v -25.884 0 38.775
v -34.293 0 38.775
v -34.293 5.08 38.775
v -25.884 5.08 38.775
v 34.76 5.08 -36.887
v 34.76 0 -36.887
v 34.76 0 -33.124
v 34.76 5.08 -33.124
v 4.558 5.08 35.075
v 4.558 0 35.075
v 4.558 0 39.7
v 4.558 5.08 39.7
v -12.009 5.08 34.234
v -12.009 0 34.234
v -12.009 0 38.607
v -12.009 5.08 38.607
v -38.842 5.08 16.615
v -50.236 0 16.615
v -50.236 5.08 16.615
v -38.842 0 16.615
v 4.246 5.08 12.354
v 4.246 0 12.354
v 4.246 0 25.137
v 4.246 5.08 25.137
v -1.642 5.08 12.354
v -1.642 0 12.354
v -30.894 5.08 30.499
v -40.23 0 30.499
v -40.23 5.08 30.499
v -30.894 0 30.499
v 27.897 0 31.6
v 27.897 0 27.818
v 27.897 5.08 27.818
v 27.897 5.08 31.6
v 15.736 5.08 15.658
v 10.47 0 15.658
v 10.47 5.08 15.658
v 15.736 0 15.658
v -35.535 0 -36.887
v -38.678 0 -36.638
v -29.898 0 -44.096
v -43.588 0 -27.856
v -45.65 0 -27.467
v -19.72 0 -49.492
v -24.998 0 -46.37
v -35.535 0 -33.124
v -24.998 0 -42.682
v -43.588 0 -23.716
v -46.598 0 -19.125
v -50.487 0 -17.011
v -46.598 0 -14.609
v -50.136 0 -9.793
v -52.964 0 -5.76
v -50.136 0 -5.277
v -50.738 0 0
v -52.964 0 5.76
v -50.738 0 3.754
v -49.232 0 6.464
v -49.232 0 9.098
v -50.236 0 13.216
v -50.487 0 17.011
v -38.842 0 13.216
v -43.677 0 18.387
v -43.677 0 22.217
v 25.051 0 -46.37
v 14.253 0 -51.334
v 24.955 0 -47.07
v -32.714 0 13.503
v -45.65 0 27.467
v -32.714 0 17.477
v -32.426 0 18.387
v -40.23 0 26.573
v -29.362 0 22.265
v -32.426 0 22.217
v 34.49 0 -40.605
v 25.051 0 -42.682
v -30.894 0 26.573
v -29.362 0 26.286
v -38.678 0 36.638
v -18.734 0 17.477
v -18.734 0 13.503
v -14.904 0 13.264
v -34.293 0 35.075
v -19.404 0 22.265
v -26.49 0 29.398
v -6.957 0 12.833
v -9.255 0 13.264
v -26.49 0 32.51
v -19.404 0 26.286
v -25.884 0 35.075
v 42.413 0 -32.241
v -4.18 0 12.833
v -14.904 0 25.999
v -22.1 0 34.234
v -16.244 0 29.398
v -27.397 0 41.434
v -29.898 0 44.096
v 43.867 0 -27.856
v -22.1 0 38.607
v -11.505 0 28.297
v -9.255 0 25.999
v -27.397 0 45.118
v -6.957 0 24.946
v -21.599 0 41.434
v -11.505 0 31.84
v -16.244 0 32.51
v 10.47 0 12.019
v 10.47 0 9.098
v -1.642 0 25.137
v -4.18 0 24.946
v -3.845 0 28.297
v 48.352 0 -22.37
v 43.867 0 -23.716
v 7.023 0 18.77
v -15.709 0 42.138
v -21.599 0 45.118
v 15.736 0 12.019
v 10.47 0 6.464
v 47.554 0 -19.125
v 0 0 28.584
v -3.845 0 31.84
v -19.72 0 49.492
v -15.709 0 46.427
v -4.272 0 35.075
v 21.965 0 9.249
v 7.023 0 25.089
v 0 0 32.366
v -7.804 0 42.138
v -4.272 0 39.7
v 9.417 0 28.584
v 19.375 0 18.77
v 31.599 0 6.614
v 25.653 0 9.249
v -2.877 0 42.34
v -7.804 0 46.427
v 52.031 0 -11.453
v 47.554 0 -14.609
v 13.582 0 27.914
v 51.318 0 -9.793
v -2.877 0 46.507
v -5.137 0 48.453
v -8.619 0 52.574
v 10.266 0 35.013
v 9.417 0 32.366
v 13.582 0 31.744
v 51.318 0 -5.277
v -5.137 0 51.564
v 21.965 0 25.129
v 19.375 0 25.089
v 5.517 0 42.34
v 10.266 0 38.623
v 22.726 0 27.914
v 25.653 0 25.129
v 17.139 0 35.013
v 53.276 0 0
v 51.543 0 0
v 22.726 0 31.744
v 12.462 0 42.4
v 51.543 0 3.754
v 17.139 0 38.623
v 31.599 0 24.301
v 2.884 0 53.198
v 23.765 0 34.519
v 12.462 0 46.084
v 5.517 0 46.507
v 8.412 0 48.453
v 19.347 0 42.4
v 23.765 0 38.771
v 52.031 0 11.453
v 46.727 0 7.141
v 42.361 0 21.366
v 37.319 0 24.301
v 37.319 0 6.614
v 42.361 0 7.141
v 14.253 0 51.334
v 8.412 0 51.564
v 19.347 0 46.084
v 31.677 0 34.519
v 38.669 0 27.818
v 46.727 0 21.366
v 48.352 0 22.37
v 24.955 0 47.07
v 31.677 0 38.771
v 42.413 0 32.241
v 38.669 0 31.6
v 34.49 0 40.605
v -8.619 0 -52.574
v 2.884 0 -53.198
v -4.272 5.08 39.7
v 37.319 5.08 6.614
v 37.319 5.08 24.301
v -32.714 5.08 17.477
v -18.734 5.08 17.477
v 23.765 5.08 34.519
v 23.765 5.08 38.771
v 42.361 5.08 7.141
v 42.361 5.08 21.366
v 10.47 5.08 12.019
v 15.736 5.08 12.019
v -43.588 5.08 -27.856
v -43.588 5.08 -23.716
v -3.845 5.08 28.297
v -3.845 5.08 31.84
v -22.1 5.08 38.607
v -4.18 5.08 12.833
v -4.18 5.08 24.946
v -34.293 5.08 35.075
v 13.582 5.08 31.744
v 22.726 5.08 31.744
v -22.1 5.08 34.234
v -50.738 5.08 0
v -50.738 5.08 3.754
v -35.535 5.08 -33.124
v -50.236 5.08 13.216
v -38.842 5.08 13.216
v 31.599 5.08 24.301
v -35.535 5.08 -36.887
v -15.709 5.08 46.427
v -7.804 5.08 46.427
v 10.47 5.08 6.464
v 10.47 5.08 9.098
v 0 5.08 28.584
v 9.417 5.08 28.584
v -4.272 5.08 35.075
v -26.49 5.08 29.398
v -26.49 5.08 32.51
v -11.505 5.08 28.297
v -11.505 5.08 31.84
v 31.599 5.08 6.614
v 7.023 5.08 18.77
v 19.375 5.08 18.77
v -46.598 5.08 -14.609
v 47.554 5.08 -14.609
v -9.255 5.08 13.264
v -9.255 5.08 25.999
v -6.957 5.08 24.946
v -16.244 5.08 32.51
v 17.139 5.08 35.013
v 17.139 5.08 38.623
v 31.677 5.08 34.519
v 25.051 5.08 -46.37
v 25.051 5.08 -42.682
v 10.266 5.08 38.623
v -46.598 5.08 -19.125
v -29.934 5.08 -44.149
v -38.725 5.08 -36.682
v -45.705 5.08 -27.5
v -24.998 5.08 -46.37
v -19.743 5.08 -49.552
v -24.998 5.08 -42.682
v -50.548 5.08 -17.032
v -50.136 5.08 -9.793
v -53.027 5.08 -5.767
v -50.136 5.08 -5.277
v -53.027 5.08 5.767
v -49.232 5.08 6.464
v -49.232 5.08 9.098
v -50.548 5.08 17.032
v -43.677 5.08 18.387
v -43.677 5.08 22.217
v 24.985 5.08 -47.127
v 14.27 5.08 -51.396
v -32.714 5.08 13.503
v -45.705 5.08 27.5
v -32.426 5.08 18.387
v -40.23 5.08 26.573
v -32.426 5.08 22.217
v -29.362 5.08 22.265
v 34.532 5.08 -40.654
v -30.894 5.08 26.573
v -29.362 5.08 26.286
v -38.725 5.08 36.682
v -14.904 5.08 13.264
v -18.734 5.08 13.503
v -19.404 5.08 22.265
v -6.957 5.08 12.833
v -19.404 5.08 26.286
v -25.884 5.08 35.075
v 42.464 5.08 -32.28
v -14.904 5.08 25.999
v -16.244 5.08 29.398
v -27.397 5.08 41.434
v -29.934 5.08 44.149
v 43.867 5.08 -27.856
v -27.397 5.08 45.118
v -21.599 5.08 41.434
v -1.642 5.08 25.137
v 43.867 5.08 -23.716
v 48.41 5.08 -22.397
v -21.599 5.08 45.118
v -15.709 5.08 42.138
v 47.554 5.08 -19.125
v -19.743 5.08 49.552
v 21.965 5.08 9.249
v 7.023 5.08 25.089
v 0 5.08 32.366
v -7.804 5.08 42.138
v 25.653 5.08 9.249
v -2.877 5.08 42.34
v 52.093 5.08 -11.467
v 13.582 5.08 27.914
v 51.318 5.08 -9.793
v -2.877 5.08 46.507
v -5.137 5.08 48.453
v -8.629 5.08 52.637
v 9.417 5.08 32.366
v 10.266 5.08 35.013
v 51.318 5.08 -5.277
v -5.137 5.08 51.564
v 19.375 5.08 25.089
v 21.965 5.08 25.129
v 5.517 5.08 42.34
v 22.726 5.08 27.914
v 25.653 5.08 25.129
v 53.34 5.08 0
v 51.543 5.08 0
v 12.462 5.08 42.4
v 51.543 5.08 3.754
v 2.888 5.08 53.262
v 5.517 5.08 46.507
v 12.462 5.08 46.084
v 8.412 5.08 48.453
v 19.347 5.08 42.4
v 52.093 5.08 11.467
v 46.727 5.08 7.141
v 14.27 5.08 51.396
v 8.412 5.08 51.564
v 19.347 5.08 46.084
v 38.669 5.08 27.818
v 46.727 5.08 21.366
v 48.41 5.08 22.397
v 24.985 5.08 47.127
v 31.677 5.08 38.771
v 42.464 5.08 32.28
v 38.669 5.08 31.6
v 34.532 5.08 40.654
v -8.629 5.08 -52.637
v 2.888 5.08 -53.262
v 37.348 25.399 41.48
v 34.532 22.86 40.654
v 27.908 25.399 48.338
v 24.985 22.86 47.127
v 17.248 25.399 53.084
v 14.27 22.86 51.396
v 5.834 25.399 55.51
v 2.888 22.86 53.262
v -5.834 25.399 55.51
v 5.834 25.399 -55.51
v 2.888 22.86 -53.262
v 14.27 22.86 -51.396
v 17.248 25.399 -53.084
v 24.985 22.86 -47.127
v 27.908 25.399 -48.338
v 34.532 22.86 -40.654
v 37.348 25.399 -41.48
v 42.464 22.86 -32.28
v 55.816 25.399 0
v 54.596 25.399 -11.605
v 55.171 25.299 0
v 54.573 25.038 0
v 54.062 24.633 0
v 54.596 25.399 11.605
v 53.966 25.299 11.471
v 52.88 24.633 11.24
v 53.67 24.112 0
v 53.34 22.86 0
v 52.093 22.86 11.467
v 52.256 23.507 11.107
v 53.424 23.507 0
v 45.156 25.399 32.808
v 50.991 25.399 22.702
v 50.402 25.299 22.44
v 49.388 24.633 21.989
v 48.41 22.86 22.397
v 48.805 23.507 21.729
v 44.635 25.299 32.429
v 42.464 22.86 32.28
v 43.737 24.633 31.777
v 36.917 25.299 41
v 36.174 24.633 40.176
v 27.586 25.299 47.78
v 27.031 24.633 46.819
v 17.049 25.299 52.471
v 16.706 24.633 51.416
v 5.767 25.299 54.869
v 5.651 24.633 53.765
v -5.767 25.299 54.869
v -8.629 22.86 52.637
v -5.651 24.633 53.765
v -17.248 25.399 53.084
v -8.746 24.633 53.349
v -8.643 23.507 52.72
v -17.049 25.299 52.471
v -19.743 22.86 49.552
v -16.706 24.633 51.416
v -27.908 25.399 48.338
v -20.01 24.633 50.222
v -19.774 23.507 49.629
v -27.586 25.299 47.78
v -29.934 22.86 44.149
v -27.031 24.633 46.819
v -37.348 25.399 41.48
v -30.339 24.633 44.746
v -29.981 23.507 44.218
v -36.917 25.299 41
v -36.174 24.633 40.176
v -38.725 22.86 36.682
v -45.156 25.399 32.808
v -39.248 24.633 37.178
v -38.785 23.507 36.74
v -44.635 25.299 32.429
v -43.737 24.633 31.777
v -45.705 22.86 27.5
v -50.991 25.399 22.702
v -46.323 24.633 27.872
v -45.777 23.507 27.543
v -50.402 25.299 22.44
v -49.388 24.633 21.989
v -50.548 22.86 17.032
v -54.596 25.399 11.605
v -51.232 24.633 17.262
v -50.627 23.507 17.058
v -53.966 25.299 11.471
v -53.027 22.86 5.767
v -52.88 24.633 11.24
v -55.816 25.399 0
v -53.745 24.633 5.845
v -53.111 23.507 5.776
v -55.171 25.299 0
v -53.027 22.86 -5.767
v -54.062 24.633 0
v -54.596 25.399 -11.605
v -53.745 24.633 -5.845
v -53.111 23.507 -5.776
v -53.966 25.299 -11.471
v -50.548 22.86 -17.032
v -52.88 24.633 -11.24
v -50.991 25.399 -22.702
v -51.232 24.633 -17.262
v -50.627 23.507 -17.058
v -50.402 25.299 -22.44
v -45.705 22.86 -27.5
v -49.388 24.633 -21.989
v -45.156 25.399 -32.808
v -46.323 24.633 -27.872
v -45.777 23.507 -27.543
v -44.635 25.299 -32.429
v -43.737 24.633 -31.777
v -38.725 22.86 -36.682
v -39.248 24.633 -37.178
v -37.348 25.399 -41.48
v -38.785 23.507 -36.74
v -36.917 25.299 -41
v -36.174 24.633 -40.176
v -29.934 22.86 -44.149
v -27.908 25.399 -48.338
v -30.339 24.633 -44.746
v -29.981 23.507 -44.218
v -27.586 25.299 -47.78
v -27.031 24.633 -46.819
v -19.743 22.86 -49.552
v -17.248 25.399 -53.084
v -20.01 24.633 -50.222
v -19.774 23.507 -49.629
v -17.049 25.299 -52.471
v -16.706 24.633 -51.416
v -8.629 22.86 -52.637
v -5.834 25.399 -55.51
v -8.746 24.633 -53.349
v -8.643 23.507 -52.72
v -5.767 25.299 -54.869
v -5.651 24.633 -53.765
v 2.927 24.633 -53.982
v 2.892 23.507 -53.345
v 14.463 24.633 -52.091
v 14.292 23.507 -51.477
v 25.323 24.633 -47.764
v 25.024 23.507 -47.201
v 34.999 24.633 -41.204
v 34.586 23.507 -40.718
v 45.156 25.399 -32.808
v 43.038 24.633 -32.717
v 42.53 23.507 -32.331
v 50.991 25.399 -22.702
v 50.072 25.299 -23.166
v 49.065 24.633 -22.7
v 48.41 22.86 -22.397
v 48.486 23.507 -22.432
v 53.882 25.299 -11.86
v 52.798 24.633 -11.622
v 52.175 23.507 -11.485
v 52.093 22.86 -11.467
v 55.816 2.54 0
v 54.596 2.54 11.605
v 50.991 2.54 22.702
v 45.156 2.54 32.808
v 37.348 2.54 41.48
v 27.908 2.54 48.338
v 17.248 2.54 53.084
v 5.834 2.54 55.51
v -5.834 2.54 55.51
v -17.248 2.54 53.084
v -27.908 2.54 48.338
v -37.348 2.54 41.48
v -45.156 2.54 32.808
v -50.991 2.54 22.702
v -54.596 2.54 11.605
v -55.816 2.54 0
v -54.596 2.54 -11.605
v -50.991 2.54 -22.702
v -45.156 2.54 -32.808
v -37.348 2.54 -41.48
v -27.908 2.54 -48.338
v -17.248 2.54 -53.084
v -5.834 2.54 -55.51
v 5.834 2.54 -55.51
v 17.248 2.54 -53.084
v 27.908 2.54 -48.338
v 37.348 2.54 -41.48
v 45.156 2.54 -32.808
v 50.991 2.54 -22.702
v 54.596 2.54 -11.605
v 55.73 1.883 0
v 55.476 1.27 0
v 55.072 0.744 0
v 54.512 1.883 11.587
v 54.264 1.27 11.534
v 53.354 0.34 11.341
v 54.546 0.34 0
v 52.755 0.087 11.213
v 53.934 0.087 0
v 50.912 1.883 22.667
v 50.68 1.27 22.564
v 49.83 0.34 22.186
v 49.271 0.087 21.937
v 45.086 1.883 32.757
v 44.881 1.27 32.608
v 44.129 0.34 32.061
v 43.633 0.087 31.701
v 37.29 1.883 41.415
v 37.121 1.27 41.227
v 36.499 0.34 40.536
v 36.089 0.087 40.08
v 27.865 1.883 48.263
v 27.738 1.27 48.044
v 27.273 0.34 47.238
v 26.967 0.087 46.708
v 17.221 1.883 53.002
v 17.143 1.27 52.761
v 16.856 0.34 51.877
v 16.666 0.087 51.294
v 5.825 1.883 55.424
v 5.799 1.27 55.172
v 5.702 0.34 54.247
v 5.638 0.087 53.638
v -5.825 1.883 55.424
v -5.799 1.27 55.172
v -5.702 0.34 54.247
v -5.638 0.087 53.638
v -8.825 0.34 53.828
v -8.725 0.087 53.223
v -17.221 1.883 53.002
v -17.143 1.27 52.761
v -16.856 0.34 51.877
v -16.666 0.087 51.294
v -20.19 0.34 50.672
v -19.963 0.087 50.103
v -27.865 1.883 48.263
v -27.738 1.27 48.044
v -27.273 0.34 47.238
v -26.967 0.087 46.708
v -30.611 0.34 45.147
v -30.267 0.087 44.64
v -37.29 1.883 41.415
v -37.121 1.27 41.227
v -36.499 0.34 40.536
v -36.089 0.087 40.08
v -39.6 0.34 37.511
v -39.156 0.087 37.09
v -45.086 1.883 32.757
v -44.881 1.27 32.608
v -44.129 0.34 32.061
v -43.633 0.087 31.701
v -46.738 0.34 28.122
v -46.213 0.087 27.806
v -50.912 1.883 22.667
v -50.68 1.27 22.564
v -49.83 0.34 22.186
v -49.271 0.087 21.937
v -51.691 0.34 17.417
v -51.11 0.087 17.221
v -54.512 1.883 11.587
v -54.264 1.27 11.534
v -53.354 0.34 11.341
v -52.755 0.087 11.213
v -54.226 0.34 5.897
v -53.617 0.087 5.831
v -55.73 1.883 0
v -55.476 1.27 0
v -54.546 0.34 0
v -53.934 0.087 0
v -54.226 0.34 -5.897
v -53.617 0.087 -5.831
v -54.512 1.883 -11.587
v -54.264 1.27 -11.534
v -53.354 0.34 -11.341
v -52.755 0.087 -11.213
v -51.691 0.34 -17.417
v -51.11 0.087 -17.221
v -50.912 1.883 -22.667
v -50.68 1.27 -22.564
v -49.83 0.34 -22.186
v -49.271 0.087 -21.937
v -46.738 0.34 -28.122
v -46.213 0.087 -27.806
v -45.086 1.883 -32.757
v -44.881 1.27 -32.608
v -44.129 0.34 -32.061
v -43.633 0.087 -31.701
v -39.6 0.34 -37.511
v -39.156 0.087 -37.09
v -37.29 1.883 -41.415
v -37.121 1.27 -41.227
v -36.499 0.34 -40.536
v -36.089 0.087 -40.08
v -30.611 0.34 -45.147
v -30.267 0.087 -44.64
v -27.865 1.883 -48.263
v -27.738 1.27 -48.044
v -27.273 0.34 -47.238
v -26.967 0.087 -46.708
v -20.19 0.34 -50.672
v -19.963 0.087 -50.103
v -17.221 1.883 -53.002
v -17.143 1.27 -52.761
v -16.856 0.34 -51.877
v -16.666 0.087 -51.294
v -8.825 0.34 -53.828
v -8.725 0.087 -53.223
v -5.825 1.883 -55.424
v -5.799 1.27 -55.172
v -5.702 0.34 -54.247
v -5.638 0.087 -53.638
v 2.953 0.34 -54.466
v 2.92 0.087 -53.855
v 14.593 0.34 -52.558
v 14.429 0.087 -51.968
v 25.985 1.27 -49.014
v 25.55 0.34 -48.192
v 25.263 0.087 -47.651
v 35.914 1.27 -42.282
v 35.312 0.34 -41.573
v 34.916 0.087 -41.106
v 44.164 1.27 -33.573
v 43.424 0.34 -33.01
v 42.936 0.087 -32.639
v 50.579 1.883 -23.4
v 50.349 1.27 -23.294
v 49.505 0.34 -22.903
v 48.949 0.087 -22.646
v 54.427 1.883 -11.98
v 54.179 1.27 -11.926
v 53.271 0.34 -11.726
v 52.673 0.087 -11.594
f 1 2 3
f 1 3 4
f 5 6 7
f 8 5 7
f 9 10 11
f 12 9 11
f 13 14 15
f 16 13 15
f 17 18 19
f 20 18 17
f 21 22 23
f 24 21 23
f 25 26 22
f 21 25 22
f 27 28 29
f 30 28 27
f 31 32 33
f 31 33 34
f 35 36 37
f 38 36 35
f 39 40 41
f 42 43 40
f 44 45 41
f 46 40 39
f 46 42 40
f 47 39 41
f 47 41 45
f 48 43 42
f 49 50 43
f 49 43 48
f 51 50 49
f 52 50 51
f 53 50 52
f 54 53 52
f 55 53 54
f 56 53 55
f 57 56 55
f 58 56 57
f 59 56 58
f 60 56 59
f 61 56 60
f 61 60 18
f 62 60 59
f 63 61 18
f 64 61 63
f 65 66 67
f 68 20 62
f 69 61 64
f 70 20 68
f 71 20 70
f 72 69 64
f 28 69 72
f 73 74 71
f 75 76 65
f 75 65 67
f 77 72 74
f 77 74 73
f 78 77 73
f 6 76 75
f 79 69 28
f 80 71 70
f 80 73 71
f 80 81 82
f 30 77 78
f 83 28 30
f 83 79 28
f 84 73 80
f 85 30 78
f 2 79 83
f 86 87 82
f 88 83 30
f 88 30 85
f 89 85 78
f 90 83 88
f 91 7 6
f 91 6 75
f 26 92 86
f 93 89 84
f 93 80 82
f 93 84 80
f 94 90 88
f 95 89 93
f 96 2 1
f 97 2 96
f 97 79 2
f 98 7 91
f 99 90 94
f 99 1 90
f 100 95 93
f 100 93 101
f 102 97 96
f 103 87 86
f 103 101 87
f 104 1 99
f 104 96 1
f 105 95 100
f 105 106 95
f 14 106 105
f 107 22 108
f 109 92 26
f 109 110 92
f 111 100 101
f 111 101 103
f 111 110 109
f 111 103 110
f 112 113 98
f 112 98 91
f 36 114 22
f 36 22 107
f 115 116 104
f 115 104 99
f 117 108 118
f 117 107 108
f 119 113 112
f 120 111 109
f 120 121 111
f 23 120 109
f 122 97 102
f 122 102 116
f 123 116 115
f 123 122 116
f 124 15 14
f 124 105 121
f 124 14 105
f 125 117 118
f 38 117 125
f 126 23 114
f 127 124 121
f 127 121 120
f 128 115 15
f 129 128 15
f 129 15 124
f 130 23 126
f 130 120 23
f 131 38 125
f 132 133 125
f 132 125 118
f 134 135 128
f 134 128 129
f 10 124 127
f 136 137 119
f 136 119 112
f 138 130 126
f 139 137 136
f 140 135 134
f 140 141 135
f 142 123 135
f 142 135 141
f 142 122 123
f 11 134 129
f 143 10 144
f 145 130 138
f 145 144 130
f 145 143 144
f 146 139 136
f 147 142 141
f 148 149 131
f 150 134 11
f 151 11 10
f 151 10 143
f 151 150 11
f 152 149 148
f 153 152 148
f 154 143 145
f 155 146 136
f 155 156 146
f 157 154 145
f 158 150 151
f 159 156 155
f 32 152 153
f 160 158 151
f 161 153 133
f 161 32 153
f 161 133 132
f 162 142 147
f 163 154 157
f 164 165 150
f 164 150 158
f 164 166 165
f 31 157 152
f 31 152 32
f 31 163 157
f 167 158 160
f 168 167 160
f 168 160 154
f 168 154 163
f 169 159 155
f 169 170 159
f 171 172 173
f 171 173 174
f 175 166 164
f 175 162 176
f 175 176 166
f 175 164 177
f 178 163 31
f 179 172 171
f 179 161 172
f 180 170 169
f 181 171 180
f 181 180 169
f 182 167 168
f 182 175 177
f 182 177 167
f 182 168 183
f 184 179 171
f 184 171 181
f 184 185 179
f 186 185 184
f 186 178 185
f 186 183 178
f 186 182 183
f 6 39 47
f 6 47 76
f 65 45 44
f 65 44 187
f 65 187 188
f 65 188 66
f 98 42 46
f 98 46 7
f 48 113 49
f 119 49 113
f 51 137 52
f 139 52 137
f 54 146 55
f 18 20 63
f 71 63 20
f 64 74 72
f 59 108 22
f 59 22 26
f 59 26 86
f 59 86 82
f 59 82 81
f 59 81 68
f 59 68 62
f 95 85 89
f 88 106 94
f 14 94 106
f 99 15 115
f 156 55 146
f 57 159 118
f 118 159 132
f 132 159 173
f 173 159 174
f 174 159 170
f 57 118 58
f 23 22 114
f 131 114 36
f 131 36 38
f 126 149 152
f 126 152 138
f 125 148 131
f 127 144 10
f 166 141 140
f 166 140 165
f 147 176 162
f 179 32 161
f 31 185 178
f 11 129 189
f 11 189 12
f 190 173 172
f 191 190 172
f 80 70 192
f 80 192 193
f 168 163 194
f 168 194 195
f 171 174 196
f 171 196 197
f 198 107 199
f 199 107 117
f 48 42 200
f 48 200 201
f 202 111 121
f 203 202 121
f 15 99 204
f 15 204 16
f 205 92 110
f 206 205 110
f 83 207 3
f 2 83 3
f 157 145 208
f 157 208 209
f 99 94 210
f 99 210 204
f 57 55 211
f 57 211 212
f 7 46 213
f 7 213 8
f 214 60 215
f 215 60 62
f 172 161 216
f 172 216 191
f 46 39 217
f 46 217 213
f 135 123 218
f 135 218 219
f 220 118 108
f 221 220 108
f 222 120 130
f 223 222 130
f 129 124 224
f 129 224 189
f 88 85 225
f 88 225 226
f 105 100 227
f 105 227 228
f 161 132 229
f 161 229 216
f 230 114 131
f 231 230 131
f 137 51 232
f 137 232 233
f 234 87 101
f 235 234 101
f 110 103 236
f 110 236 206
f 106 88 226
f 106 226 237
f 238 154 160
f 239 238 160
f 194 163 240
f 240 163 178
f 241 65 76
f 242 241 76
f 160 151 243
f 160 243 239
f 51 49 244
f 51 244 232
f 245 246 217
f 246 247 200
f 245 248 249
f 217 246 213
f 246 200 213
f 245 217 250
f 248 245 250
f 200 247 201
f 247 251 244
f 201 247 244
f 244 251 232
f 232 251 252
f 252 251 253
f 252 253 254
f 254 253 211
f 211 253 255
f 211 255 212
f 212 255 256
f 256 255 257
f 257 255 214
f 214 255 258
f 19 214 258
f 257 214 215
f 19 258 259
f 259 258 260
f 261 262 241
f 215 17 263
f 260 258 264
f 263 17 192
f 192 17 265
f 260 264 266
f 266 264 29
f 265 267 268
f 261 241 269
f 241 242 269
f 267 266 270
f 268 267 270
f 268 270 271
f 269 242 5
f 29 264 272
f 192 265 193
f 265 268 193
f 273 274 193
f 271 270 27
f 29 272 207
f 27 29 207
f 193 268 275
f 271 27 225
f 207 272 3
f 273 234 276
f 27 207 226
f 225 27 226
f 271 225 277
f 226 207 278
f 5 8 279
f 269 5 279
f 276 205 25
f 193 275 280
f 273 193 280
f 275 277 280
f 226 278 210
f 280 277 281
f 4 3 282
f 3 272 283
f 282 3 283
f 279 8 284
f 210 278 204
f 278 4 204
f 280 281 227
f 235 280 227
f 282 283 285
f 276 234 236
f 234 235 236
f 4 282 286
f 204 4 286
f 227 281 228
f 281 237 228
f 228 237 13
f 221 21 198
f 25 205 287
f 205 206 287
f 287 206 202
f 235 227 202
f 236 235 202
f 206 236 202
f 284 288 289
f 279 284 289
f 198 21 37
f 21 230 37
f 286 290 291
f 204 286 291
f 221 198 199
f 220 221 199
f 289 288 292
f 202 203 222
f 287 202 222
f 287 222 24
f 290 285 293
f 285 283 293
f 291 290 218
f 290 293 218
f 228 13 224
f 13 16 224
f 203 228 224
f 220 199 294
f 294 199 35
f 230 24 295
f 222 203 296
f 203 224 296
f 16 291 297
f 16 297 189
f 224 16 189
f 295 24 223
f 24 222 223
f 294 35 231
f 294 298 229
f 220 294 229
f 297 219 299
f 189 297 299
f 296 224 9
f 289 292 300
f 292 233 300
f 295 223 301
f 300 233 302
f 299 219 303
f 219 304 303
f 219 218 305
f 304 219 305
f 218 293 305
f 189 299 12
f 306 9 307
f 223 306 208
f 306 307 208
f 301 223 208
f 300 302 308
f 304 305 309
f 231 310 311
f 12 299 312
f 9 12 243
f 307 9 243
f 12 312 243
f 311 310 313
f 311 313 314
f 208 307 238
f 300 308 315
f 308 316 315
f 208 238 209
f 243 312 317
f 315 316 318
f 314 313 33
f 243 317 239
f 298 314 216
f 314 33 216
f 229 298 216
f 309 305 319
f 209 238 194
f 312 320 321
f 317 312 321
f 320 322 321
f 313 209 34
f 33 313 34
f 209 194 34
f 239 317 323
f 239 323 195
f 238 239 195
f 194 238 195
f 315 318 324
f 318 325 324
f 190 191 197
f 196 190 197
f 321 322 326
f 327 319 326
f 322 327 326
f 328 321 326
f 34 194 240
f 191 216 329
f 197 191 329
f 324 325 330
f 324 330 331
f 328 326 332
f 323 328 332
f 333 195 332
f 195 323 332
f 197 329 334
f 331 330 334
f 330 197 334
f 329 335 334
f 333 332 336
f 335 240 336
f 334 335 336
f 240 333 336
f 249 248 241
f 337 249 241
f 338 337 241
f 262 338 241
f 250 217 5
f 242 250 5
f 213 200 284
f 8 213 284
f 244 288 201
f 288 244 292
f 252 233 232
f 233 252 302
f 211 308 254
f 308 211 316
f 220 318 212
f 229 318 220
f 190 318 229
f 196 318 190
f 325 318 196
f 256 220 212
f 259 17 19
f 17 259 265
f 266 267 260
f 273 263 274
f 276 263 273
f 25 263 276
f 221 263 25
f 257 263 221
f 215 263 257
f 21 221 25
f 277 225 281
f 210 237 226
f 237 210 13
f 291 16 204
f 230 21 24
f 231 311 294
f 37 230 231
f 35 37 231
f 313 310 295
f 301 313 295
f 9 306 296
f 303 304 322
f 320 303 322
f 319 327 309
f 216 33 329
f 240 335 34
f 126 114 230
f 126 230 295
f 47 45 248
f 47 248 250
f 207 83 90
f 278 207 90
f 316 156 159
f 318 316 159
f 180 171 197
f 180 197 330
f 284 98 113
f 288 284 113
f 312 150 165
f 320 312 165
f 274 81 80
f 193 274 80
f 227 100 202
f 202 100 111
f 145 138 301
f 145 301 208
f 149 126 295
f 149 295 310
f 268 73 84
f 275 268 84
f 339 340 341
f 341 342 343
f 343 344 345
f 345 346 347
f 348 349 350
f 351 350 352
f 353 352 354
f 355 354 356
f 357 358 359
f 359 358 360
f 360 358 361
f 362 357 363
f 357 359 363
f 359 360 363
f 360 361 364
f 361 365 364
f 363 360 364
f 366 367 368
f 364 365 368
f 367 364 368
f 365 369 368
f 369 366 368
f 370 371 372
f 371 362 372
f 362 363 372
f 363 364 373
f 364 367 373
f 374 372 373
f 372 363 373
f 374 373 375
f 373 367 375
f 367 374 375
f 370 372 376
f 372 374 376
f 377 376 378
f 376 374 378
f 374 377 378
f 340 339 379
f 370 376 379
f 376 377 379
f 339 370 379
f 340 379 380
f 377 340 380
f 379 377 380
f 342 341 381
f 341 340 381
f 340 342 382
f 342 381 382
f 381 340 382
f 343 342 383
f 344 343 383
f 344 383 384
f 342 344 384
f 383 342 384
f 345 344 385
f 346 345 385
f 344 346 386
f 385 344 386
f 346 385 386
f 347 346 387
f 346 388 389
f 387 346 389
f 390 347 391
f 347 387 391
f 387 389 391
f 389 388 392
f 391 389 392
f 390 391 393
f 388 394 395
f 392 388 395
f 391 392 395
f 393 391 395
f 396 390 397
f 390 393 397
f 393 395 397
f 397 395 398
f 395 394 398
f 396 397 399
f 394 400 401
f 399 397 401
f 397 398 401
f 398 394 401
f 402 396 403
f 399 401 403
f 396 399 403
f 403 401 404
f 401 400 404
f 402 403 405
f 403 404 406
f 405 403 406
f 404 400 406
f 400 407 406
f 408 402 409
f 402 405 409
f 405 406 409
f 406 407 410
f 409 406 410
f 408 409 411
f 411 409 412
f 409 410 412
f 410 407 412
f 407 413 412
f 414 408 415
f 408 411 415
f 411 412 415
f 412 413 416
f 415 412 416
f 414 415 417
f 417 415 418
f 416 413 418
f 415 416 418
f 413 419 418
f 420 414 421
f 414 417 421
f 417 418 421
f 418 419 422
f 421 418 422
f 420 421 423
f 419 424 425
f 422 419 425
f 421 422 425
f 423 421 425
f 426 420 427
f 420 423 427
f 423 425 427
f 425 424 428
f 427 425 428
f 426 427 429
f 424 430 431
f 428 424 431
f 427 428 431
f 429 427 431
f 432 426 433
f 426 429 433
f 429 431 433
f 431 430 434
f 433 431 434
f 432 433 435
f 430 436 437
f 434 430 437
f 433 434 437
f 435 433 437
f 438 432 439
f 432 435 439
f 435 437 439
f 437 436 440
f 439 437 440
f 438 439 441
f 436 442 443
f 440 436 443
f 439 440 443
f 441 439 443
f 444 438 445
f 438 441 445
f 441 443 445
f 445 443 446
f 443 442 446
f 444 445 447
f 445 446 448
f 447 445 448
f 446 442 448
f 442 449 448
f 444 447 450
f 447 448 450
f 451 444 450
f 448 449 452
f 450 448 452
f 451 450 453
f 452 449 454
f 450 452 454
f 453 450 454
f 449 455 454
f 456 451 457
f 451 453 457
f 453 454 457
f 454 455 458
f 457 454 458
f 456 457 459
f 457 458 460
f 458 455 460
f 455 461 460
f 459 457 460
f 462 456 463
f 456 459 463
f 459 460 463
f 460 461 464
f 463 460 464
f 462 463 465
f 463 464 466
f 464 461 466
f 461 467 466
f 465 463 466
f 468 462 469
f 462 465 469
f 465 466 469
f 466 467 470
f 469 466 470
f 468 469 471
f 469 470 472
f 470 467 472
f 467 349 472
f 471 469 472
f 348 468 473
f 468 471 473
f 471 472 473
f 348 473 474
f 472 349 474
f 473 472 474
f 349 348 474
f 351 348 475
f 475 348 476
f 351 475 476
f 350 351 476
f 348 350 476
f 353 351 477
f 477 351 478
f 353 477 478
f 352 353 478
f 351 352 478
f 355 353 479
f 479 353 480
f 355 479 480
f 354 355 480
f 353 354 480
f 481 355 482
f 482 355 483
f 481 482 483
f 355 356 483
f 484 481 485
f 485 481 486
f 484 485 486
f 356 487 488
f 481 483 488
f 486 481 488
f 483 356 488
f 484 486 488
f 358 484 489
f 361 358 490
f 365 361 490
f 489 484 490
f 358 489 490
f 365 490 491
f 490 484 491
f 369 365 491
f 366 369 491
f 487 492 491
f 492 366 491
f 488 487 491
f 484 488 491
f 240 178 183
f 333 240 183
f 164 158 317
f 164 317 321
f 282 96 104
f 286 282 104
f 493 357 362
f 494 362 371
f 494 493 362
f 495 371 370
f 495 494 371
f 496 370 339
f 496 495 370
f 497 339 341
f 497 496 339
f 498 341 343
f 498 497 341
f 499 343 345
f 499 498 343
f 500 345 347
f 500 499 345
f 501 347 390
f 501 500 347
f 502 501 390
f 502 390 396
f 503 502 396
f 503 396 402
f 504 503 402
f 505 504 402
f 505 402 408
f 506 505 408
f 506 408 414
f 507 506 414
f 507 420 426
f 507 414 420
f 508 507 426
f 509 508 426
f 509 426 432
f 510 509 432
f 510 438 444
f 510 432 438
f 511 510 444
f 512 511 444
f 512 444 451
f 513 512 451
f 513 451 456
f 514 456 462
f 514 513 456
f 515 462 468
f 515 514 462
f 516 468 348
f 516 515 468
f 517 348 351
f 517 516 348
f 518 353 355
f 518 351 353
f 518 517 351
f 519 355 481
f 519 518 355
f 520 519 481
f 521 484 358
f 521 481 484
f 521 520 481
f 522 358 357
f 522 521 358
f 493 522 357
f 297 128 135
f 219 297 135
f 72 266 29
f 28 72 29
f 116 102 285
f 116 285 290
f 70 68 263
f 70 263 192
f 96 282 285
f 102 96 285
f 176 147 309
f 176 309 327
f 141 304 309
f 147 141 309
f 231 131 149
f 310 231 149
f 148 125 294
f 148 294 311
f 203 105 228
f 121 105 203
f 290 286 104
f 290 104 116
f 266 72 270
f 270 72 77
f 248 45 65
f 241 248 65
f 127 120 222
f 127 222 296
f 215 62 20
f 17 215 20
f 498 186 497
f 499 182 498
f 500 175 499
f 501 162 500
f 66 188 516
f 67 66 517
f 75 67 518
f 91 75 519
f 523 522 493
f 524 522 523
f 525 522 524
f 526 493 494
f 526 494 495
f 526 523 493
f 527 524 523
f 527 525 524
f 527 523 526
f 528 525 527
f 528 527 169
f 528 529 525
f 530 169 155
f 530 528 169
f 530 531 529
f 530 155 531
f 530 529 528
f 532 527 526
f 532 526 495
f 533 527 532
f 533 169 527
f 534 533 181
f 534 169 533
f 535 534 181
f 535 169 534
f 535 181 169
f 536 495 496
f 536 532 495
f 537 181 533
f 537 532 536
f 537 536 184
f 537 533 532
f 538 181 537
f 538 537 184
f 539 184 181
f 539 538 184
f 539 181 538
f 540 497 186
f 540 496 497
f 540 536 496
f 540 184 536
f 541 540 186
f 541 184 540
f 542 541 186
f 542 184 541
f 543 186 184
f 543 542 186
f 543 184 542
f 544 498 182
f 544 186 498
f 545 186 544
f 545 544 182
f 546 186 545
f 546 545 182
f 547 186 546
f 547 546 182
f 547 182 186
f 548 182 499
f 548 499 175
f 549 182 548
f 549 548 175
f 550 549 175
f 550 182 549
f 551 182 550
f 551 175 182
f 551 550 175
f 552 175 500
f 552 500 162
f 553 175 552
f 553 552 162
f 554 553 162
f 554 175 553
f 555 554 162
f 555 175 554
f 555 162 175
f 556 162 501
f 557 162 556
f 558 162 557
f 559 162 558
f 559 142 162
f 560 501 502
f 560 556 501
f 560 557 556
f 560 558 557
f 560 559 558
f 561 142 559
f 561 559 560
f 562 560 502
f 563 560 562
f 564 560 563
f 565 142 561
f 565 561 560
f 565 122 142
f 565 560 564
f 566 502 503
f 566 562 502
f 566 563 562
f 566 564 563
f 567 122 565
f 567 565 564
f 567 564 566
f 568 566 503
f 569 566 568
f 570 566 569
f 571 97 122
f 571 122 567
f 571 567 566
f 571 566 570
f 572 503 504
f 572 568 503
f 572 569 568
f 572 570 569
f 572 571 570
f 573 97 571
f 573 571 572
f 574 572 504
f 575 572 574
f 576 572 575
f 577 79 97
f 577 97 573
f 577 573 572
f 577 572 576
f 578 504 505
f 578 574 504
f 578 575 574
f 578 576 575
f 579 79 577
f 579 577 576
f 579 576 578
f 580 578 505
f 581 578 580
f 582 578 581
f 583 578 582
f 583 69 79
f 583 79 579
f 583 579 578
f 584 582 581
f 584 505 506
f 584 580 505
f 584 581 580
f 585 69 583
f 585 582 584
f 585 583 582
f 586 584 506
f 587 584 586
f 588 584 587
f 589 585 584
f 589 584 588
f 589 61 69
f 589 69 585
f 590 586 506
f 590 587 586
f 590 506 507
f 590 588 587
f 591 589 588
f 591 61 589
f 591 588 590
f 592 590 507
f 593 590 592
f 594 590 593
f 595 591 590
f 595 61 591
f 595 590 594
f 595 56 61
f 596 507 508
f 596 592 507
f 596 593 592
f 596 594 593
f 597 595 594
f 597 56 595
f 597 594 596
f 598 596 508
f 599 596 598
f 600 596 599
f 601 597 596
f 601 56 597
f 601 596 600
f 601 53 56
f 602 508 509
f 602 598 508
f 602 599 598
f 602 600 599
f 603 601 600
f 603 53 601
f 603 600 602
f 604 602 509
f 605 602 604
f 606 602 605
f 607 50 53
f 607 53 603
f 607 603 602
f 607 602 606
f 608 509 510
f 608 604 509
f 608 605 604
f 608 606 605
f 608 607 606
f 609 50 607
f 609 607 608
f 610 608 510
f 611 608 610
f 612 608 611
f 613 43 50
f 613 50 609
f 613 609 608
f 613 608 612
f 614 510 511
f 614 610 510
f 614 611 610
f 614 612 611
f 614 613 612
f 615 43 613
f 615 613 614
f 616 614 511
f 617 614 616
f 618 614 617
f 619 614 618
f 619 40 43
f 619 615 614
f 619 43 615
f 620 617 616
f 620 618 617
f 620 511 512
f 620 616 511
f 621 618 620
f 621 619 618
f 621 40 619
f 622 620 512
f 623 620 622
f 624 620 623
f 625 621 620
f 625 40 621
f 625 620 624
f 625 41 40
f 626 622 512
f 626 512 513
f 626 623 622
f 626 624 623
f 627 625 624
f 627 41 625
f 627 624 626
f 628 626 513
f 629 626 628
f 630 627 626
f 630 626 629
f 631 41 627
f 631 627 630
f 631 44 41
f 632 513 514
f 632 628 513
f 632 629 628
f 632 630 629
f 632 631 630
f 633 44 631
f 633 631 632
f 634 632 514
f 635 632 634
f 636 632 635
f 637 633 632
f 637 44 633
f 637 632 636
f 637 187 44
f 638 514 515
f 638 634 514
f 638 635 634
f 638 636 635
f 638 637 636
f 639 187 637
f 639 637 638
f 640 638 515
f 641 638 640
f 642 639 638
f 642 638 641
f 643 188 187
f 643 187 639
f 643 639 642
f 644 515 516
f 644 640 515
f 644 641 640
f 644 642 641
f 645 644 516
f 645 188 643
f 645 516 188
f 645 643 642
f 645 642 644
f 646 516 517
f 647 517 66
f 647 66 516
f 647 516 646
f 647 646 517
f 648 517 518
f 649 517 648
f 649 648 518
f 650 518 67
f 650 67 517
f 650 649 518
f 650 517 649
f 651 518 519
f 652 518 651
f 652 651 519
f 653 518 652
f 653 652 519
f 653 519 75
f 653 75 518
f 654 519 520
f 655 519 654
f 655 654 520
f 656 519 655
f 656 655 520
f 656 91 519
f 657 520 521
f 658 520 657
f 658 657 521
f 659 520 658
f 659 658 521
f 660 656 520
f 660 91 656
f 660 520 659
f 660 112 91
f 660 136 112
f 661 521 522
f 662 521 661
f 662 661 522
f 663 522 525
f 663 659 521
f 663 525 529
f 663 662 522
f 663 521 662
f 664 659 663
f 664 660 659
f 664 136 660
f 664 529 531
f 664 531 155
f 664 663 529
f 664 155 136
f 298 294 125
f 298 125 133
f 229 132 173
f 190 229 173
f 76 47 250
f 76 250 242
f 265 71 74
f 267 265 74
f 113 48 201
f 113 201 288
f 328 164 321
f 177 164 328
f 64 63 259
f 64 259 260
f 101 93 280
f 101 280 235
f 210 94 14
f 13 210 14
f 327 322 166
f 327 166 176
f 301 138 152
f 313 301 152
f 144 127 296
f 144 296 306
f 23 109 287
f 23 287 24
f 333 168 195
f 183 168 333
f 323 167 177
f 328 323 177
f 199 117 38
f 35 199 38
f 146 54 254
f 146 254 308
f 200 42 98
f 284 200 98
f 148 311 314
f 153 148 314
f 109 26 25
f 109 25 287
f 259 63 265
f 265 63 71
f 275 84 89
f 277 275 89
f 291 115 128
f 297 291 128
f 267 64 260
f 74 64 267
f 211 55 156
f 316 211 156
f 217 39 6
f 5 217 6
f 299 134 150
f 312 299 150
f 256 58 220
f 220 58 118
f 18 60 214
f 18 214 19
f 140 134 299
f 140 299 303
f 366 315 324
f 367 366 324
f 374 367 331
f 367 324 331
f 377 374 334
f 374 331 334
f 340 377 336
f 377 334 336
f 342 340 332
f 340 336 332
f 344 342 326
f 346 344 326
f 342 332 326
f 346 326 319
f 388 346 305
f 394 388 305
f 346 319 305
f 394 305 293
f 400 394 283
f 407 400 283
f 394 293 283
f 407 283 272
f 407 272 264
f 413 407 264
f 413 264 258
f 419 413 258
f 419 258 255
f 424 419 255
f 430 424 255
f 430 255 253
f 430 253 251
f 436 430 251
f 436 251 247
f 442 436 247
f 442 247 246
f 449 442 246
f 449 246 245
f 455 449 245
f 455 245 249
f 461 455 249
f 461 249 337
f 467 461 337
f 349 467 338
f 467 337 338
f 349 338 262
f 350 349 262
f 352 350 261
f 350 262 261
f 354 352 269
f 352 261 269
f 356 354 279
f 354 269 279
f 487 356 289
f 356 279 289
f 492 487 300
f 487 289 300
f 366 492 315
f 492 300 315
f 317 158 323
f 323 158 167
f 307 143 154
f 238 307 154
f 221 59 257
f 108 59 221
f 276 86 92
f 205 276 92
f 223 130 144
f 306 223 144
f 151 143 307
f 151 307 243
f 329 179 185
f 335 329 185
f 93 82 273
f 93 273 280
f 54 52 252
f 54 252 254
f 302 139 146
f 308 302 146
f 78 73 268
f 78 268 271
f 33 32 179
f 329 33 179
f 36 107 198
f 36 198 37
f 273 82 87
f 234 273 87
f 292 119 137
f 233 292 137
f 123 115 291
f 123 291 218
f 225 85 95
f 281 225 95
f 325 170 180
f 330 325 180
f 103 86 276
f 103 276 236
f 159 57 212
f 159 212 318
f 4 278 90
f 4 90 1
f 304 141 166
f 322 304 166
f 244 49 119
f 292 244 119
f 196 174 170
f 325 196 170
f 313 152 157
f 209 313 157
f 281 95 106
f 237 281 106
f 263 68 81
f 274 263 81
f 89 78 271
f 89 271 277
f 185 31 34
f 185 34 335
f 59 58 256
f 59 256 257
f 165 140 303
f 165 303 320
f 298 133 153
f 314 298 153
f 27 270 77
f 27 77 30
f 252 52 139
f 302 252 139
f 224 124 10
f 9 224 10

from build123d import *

# Parameters (mm, degrees)
F0_R     = 55.8162031388
F0_R_2   = 53.34
F1_DEPTH = 25.4
F2_DEPTH = 5.08
F3_W     = 13.5487690568
F3_H     = 3.1119100749
F3_W_2   = 8.3945244551
F3_H_2   = 4.1670650244
F3_W_3   = 7.9046934843
F3_H_3   = 4.2887181044
F3_W_4   = 5.7976543903
F3_H_4   = 3.6839321256
F3_W_5   = 8.4092468023
F3_H_5   = 3.7000700831
F3_W_6   = 10.0910961628
F3_H_6   = 4.372805357
F3_W_7   = 8.8297128677
F3_H_7   = 4.6250857413
F3_W_8   = 6.8733096123
F3_H_8   = 3.6097243428
F3_W_9   = 6.8847164512
F3_H_9   = 3.6839284003
F3_W_10  = 7.9117268324
F3_H_10  = 4.2525529861
F3_W_11  = 10.2453604341
F3_H_11  = 3.1119063497
F3_W_12  = 9.3357227743
F3_H_12  = 3.9257928729
F3_W_13  = 9.9581070244
F3_H_13  = 4.0215402842
F3_W_14  = 13.9796473086
F3_H_14  = 3.9736665785
F3_W_15  = 11.2507455051
F3_H_15  = 3.8300380111
F3_W_16  = 11.3943703473
F3_H_16  = 3.3991634846
F3_W_17  = 7.6600834727
F3_H_17  = 3.5427883267
F3_W_18  = 9.4169080257
F3_H_18  = 3.7821643054
F3_W_19  = 9.1442242265
F3_H_19  = 3.8300417364
F3_W_20  = 10.7719898224
F3_W_21  = 5.6493058801
F3_H_20  = 12.7348862588
F3_W_22  = 2.7767792344
F3_H_21  = 12.112505734
F3_W_23  = 5.8886855841
F3_H_22  = 12.7827599645
F3_W_24  = 12.351885438
F3_H_23  = 6.3195675611
F3_W_25  = 5.2663087845
F3_H_24  = 3.6385394633
F3_W_26  = 3.6878287792
F3_H_25  = 15.8802717924
F3_W_27  = 5.7199150324
F3_H_26  = 17.6865570247
F3_W_28  = 4.3651908636
F3_H_27  = 14.2245069146
F3_W_29  = 59.7025379539
F3_H_28  = 2.6341676712
F3_W_30  = 102.2809818387
F3_H_29  = 3.7544369698
F3_W_31  = 101.4531031251
F3_H_30  = 4.5157186687
F3_W_32  = 50.049200654
F3_H_31  = 3.6878362298
F3_W_33  = 70.2946484089
F3_H_32  = 3.7630945444
F3_W_34  = 87.4543711543
F3_H_33  = 4.1394084692
F3_W_35  = 94.1526964307
F3_H_34  = 4.5157149434
F4_DEPTH = 25.4


# Not quite as in the source:
# - a fillet or chamfer that OpenCascade refuses, or shapes differently, is made with other operations: its cross-section is extruded or revolved along the edge and cut away or added


with BuildPart() as f1:
    # F0 (on Front) → F1 (new body)
    with BuildSketch(Plane.XZ):
        Circle(F0_R)
        Circle(F0_R_2, mode=Mode.SUBTRACT)
    extrude(amount=-F1_DEPTH)

    # F0 (on Front) → F2 (join)
    with BuildSketch(Plane.XZ):
        Circle(F0_R_2)
    extrude(amount=-F2_DEPTH)

    # F3 (on face) → F4 (cut)
    with BuildSketch(Plane.XZ):
        with Locations((1.637134701, 50.0085186213)):
            Rectangle(F3_W, F3_H)
        with Locations((1.3199597597, 44.4235429168)):
            Rectangle(F3_W_2, F3_H_2)
        with Locations((-11.756375432, 44.2828312516)):
            Rectangle(F3_W_3, F3_H_3)
        with Locations((-24.4977399707, 43.2760901749)):
            Rectangle(F3_W_4, F3_H_4)
        with Locations((-30.0885364413, 36.9247384369)):
            Rectangle(F3_W_5, F3_H_5)
        with Locations((-17.0542001724, 36.4201851189)):
            Rectangle(F3_W_6, F3_H_6)
        with Locations((0.1427084208, 37.387246266)):
            Rectangle(F3_W_7, F3_H_7)
        with Locations((13.7023478746, 36.8178598583)):
            Rectangle(F3_W_8, F3_H_8)
        with Locations((15.9046910703, 44.2423652858)):
            Rectangle(F3_W_9, F3_H_9)
        with Locations((27.7209356427, 36.6447903216)):
            Rectangle(F3_W_10, F3_H_10)
        with Locations((-21.367046982, 30.954066664)):
            Rectangle(F3_W_11, F3_H_11)
        with Locations((-35.5621371418, 28.5363532603)):
            Rectangle(F3_W_12, F3_H_12)
        with Locations((-24.3832040578, 24.2754332721)):
            Rectangle(F3_W_13, F3_H_13)
        with Locations((-25.7237199694, 15.490276739)):
            Rectangle(F3_W_14, F3_H_14)
        with Locations((-38.0516629666, 20.3017666936)):
            Rectangle(F3_W_15, F3_H_15)
        with Locations((-44.5387940854, 14.9157717824)):
            Rectangle(F3_W_16, F3_H_16)
        with Locations((-7.6746530831, 30.0683714449)):
            Rectangle(F3_W_17, F3_H_17)
        with Locations((4.7084540129, 30.4753128439)):
            Rectangle(F3_W_18, F3_H_18)
        with Locations((18.1541852653, 29.8289936036)):
            Rectangle(F3_W_19, F3_H_19)
        with Locations((33.2828462124, 29.7093037516)):
            Rectangle(F3_W_20, F3_H_18)
        with Locations((-12.0791979134, 19.6315106004)):
            Rectangle(F3_W_21, F3_H_20)
        with Locations((-5.5681280792, 18.8894383609)):
            Rectangle(F3_W_22, F3_H_21)
        with Locations((1.3020038605, 18.7458135188)):
            Rectangle(F3_W_23, F3_H_22)
        with Locations((13.1990686059, 21.9295322895)):
            Rectangle(F3_W_24, F3_H_23)
        with Locations((13.1033211946, 13.8385724276)):
            Rectangle(F3_W_25, F3_H_24)
        with Locations((23.8093435764, 17.1886943281)):
            Rectangle(F3_W_26, F3_H_25)
        with Locations((34.458912909, 15.457669273)):
            Rectangle(F3_W_27, F3_H_26)
        with Locations((44.544018805, 14.2534784973)):
            Rectangle(F3_W_28, F3_H_27)
        with Locations((-19.3811021745, 7.7809505165)):
            Rectangle(F3_W_29, F3_H_28)
        with Locations((0.4028789699, 1.8772184849)):
            Rectangle(F3_W_30, F3_H_29)
        with Locations((0.5910359323, -7.5348559767)):
            Rectangle(F3_W_31, F3_H_30)
        with Locations((0.026576221, -44.526103884)):
            Rectangle(F3_W_32, F3_H_31)
        with Locations((-0.3873705864, -35.0054651499)):
            Rectangle(F3_W_33, F3_H_32)
        with Locations((0.1394636929, -25.7858783007)):
            Rectangle(F3_W_34, F3_H_33)
        with Locations((0.4781447351, -16.8673358858)):
            Rectangle(F3_W_35, F3_H_34)
    extrude(amount=-F4_DEPTH, mode=Mode.SUBTRACT)

    # F5: fillet of radius 2.54 on 2 edges, made by hand

    # F5_s1 → F5_t2 (revolve, cut)
    with BuildSketch(Plane.XY):
        with BuildLine():
            ThreePointArc((55.8162031388, 2.54), (55.072254363, 0.7439487758), (53.2762031388, 0))
            Line((53.2762031388, 0), (55.8162031388, 0))
            Line((55.8162031388, 0), (55.8162031388, 2.54))
        make_face()
    revolve(axis=Axis((0, 0, 0), (0, -1, 0)), mode=Mode.SUBTRACT)

    # F5_s3 → F5_t4 (revolve, cut)
    with BuildSketch(Plane.XY):
        with BuildLine():
            ThreePointArc((55.88, 25.4), (54.0839487758, 24.6560512242), (53.34, 22.86))
            Line((53.34, 22.86), (53.34, 25.4))
            Line((53.34, 25.4), (55.88, 25.4))
        make_face()
    revolve(axis=Axis((0, 25.4, 0), (0, -1, 0)), mode=Mode.SUBTRACT)


solid = f1.part
